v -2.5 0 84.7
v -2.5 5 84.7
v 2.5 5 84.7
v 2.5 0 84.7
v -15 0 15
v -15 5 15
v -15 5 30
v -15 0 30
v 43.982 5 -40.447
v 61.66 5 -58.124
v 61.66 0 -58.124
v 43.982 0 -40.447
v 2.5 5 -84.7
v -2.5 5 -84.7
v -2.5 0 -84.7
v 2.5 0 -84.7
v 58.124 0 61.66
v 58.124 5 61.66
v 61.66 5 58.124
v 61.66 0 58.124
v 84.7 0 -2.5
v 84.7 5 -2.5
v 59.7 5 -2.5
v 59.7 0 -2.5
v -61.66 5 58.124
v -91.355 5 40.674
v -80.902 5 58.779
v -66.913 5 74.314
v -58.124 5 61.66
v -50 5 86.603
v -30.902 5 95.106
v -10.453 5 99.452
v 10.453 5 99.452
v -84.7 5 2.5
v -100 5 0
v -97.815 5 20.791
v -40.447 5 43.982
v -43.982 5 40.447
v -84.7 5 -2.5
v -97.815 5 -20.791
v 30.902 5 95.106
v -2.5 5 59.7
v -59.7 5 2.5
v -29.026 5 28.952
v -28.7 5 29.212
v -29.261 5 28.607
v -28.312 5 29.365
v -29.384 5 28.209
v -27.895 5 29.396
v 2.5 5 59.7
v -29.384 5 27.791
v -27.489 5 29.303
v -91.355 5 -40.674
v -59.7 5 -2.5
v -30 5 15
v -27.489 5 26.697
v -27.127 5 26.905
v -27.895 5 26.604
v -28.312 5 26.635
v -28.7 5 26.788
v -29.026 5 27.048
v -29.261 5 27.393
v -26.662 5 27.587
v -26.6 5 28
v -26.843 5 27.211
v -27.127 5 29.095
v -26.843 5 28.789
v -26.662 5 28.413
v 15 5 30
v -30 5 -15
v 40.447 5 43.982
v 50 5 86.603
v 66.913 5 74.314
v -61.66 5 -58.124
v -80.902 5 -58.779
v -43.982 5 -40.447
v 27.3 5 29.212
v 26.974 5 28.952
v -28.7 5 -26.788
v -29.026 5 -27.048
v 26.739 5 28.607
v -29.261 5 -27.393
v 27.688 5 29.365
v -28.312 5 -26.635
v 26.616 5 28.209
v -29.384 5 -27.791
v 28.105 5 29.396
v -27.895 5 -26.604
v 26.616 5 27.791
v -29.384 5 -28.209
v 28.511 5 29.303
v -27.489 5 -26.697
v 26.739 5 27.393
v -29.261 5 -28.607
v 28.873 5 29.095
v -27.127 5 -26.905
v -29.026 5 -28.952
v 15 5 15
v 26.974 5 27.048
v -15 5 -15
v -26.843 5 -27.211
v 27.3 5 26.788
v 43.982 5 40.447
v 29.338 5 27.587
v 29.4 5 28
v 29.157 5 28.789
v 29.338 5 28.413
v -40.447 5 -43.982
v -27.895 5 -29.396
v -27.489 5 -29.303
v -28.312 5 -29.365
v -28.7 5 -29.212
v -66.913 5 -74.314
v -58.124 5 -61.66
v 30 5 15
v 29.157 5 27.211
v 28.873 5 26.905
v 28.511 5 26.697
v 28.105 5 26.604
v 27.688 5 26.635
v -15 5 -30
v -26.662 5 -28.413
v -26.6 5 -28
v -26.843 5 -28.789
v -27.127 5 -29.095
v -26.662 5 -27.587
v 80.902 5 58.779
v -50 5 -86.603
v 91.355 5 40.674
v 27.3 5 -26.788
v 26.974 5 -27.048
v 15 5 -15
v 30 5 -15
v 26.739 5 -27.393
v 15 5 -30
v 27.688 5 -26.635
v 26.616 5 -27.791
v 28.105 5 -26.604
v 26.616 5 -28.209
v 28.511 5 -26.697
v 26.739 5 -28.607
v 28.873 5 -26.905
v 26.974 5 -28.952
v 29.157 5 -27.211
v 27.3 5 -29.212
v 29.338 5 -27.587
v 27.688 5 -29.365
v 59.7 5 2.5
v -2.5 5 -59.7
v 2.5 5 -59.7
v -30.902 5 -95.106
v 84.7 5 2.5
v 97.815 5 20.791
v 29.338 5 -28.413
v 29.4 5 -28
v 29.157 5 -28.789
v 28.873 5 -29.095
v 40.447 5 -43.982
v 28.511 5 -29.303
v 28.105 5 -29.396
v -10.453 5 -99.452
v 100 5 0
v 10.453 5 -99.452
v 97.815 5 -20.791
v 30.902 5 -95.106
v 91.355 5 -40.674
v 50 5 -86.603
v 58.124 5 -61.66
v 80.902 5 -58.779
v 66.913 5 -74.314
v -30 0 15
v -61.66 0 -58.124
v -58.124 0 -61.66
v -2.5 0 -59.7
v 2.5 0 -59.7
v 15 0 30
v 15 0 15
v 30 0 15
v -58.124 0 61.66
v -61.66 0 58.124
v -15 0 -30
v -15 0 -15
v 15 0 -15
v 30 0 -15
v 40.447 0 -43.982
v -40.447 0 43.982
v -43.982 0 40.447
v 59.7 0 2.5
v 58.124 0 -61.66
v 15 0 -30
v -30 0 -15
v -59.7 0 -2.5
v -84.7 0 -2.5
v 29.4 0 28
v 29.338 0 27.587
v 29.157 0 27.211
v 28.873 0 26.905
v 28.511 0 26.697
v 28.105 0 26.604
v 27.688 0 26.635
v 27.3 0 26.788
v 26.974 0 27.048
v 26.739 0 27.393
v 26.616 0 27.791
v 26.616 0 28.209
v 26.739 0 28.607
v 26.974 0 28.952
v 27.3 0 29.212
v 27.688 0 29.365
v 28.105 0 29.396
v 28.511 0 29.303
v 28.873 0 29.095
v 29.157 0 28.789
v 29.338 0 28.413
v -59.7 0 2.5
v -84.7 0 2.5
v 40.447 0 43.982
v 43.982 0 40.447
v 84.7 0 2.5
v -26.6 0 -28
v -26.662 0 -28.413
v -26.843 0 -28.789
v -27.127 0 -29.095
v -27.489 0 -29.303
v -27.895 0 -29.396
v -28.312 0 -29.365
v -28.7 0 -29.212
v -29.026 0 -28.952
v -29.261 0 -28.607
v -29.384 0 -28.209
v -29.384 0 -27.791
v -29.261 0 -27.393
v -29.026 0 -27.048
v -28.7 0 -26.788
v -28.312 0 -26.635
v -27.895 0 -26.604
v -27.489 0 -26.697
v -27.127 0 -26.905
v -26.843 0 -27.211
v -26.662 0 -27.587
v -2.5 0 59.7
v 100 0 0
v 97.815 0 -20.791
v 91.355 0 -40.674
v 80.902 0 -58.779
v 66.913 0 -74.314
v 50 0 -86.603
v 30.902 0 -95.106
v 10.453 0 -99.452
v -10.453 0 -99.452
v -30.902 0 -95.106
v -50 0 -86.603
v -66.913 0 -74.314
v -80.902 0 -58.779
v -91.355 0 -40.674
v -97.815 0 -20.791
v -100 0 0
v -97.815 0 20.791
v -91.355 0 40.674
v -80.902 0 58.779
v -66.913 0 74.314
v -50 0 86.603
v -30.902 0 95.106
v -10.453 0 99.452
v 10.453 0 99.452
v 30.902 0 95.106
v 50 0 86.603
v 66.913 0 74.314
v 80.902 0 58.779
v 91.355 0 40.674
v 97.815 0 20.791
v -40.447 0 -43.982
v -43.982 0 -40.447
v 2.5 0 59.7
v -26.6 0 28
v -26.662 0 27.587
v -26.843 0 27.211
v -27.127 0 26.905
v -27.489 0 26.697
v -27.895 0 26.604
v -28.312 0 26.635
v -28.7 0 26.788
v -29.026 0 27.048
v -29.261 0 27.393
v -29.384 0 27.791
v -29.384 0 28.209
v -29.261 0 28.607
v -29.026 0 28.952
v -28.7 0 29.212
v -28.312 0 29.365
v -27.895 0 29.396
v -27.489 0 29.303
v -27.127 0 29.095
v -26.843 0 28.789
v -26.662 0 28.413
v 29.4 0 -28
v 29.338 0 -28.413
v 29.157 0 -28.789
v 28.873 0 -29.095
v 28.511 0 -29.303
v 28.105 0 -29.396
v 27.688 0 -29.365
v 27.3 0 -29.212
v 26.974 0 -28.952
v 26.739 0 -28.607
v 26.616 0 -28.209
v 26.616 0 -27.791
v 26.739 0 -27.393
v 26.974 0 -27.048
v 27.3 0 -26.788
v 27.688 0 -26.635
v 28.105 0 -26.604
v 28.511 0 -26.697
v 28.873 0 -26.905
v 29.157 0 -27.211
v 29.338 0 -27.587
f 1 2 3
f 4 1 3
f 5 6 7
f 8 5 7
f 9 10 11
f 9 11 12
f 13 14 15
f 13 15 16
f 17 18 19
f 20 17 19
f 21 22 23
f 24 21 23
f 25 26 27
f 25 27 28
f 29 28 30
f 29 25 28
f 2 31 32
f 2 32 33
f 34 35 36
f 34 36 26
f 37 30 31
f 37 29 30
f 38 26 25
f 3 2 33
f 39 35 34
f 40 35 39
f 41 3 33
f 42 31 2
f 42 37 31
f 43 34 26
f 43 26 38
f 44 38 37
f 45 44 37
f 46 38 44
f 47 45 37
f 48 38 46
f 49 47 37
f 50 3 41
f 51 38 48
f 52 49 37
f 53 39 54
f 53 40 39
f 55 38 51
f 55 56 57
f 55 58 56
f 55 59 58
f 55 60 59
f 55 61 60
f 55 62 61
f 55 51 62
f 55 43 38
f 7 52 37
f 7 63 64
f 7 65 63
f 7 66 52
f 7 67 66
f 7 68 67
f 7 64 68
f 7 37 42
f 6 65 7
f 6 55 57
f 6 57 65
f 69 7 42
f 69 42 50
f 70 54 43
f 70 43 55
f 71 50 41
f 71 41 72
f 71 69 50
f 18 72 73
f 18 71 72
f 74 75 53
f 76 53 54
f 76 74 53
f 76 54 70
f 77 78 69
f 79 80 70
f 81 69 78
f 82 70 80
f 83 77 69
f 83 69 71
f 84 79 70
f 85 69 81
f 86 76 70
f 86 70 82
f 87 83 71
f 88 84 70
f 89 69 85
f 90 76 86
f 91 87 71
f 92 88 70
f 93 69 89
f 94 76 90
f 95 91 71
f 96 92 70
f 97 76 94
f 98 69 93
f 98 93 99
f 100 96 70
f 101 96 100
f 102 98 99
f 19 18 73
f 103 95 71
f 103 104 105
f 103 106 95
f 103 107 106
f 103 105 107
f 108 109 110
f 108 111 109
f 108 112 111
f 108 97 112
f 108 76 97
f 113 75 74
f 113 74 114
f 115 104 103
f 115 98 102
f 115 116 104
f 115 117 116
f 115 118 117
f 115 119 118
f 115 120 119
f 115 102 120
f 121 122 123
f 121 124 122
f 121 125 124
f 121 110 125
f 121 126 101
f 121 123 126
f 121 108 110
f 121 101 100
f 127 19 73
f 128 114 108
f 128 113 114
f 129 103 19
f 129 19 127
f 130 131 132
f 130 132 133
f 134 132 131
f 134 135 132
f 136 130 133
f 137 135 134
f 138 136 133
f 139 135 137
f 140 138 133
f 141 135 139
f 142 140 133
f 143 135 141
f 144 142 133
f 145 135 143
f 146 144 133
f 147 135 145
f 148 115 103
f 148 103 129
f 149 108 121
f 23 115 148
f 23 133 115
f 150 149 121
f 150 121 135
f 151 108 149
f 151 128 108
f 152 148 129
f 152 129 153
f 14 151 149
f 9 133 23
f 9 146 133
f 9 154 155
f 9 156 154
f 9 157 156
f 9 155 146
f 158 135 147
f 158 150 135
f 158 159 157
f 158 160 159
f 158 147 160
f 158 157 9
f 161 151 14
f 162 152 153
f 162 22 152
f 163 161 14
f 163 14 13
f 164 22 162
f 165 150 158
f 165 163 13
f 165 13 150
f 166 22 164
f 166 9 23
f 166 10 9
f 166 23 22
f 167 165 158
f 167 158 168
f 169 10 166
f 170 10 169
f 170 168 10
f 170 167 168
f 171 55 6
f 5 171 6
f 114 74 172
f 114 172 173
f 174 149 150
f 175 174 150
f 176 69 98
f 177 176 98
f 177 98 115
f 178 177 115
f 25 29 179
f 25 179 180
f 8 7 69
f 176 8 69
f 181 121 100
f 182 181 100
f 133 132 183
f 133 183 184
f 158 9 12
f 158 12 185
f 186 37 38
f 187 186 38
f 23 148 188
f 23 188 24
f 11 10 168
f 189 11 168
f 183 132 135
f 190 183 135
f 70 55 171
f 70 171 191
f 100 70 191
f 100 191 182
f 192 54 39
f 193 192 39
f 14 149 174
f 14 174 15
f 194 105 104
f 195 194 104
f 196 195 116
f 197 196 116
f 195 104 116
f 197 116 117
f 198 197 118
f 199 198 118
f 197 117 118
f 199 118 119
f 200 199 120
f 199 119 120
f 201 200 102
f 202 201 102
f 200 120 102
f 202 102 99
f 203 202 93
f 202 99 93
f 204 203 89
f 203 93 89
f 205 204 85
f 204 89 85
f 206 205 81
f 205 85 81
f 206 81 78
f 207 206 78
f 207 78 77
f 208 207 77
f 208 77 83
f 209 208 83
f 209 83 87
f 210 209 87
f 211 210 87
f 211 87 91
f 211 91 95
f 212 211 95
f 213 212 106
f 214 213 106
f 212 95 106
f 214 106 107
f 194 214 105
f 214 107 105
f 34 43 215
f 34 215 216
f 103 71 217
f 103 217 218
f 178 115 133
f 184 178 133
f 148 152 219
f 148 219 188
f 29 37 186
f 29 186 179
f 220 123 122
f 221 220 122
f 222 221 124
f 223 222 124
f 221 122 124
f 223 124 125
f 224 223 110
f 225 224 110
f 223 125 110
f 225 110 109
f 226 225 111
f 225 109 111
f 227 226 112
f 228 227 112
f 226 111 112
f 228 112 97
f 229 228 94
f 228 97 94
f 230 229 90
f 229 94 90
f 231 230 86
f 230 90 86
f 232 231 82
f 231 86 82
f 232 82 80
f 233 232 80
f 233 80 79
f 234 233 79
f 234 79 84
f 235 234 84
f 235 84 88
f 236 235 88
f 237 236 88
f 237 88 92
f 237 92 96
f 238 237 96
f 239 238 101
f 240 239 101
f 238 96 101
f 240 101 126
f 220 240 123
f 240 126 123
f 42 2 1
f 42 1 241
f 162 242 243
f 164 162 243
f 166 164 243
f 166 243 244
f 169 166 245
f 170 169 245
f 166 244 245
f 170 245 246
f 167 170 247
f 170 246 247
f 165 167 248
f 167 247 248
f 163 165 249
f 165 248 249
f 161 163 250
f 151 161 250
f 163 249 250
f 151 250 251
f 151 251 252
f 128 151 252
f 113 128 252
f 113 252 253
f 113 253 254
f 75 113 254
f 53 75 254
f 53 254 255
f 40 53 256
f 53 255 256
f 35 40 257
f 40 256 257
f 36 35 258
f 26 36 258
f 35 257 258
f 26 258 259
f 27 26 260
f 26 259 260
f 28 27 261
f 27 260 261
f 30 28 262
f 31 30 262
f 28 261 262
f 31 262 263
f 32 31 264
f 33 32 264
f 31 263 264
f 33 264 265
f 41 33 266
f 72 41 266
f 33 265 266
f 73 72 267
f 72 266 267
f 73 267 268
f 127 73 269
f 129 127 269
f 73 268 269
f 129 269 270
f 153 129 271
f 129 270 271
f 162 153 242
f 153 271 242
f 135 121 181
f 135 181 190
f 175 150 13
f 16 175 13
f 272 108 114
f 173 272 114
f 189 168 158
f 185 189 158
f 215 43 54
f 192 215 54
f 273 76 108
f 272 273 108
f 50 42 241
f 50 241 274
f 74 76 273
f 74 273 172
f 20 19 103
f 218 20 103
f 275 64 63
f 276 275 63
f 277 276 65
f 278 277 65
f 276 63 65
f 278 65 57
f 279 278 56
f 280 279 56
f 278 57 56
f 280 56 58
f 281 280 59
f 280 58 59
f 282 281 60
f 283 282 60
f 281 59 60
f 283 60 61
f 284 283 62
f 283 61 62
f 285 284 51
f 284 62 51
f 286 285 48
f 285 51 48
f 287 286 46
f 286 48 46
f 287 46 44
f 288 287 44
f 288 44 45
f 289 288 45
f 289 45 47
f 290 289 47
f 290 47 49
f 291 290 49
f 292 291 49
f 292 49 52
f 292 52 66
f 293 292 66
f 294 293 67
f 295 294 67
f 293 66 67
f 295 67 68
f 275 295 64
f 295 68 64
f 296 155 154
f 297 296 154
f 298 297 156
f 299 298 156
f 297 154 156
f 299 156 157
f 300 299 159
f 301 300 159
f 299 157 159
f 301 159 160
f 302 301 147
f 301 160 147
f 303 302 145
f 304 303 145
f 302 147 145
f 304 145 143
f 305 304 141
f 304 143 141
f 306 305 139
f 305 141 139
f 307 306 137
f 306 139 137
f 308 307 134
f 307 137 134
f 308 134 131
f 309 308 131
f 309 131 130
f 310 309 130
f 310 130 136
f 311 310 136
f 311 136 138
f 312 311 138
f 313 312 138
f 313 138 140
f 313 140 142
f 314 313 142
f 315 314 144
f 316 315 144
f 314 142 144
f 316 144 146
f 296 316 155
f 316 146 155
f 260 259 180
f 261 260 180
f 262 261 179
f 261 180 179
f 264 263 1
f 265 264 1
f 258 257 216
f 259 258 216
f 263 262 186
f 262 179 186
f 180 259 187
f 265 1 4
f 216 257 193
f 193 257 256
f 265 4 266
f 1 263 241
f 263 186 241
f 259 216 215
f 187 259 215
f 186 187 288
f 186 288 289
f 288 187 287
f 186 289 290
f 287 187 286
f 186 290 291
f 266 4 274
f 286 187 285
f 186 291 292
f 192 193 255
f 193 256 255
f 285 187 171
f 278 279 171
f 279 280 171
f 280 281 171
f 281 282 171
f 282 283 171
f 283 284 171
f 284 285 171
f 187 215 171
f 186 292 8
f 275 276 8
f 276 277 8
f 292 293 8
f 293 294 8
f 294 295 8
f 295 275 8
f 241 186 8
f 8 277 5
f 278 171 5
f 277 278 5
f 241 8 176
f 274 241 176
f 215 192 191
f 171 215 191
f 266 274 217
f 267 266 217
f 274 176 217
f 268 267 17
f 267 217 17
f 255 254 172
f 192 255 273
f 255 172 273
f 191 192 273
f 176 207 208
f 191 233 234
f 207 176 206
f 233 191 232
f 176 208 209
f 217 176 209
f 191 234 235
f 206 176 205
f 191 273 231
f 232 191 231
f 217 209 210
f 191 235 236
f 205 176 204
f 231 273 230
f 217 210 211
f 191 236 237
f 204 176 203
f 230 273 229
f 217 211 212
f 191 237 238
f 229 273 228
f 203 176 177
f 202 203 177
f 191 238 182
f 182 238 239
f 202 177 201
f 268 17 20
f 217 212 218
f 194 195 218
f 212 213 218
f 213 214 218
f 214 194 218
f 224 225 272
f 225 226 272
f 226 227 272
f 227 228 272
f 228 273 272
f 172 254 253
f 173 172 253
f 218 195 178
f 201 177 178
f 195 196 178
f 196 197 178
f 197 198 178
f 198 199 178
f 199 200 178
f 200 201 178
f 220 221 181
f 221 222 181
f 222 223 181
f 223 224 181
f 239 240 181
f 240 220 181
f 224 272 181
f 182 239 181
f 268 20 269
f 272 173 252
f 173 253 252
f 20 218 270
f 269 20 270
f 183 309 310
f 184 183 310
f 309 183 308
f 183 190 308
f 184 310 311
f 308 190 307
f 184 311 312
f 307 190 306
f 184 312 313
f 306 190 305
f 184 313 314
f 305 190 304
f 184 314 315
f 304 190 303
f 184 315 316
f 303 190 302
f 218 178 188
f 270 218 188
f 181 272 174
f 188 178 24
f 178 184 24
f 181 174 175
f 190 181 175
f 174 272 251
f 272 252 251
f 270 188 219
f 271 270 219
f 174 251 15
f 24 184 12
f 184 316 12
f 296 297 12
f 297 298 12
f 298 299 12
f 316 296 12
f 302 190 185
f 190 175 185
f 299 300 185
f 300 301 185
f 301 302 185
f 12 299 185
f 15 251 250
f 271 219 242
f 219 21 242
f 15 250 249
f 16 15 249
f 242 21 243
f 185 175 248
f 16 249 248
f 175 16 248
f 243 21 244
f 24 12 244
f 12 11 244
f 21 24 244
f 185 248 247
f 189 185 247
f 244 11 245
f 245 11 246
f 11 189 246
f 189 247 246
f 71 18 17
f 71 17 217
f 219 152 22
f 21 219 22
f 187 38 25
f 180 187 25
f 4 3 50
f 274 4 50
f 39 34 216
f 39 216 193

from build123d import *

# Parameters (mm, degrees)
SKETCH_1_R               = 100
EXTRUDE_1_DEPTH          = 5
SKETCH_2_R               = 1.4
CUT_EXTRUDE_1_DEPTH      = 5
SKETCH_4_W               = 5
SKETCH_4_H               = 25
CUT_EXTRUDE_2_DEPTH      = 5
PATTERN_CIRCULAR_2_COUNT = 4
PATTERN_CIRCULAR_2_ANGLE = 135
SKETCH_5_W               = 30
SKETCH_5_H               = 30
SKETCH_5_H_2             = 15
SKETCH_5_W_2             = 15
CUT_EXTRUDE_3_DEPTH      = 5


with BuildPart() as part:
    # 草图1 → 凸台-拉伸1 (new body)
    with BuildSketch(Plane(origin=(0, 0, 0), x_dir=(1, 0, 0), z_dir=(0, 1, 0))):
        Circle(SKETCH_1_R)
    extrude(amount=EXTRUDE_1_DEPTH)

    # 草图2 → 切除-拉伸1 (cut)
    with BuildSketch(Plane(origin=(0, 5, 0), x_dir=(1, 0, 0), z_dir=(0, 1, 0))):
        with Locations((28, 28)):
            Circle(SKETCH_2_R)
        with Locations((28, -28)):
            Circle(SKETCH_2_R)
        with Locations((-28, -28)):
            Circle(SKETCH_2_R)
        with Locations((-28, 28)):
            Circle(SKETCH_2_R)
    extrude(amount=-CUT_EXTRUDE_1_DEPTH, mode=Mode.SUBTRACT)

    # 草图4 → 切除-拉伸2 (cut)
    with BuildSketch(Plane(origin=(0, 5, 0), x_dir=(1, 0, 0), z_dir=(0, 1, 0))):
        with Locations((0, 72.2)):
            Rectangle(SKETCH_4_W, SKETCH_4_H)
        with Locations((0, -72.2)):
            Rectangle(SKETCH_4_W, SKETCH_4_H)
    cut_extrude_2 = extrude(amount=-CUT_EXTRUDE_2_DEPTH, mode=Mode.SUBTRACT)

    # 阵列(圆周)2: 切除-拉伸2 ×4 about axis
    pattern_circular_2_axis = Axis((0, 0, 0), (0, 1, 0))
    for i in range(1, PATTERN_CIRCULAR_2_COUNT):
        add(cut_extrude_2.rotate(pattern_circular_2_axis, i * PATTERN_CIRCULAR_2_ANGLE / (PATTERN_CIRCULAR_2_COUNT - 1)), mode=Mode.SUBTRACT)

    # 草图5 → 切除-拉伸3 (cut)
    with BuildSketch(Plane(origin=(0, 5, 0), x_dir=(1, 0, 0), z_dir=(0, 1, 0))):
        Rectangle(SKETCH_5_W, SKETCH_5_H)
        with Locations((0, 22.5)):
            Rectangle(SKETCH_5_W, SKETCH_5_H_2)
        with Locations((22.5, 0)):
            Rectangle(SKETCH_5_W_2, SKETCH_5_H)
        with Locations((0, -22.5)):
            Rectangle(SKETCH_5_W, SKETCH_5_H_2)
        with Locations((-22.5, 0)):
            Rectangle(SKETCH_5_W_2, SKETCH_5_H)
    extrude(amount=-CUT_EXTRUDE_3_DEPTH, mode=Mode.SUBTRACT)


solid = part.part
